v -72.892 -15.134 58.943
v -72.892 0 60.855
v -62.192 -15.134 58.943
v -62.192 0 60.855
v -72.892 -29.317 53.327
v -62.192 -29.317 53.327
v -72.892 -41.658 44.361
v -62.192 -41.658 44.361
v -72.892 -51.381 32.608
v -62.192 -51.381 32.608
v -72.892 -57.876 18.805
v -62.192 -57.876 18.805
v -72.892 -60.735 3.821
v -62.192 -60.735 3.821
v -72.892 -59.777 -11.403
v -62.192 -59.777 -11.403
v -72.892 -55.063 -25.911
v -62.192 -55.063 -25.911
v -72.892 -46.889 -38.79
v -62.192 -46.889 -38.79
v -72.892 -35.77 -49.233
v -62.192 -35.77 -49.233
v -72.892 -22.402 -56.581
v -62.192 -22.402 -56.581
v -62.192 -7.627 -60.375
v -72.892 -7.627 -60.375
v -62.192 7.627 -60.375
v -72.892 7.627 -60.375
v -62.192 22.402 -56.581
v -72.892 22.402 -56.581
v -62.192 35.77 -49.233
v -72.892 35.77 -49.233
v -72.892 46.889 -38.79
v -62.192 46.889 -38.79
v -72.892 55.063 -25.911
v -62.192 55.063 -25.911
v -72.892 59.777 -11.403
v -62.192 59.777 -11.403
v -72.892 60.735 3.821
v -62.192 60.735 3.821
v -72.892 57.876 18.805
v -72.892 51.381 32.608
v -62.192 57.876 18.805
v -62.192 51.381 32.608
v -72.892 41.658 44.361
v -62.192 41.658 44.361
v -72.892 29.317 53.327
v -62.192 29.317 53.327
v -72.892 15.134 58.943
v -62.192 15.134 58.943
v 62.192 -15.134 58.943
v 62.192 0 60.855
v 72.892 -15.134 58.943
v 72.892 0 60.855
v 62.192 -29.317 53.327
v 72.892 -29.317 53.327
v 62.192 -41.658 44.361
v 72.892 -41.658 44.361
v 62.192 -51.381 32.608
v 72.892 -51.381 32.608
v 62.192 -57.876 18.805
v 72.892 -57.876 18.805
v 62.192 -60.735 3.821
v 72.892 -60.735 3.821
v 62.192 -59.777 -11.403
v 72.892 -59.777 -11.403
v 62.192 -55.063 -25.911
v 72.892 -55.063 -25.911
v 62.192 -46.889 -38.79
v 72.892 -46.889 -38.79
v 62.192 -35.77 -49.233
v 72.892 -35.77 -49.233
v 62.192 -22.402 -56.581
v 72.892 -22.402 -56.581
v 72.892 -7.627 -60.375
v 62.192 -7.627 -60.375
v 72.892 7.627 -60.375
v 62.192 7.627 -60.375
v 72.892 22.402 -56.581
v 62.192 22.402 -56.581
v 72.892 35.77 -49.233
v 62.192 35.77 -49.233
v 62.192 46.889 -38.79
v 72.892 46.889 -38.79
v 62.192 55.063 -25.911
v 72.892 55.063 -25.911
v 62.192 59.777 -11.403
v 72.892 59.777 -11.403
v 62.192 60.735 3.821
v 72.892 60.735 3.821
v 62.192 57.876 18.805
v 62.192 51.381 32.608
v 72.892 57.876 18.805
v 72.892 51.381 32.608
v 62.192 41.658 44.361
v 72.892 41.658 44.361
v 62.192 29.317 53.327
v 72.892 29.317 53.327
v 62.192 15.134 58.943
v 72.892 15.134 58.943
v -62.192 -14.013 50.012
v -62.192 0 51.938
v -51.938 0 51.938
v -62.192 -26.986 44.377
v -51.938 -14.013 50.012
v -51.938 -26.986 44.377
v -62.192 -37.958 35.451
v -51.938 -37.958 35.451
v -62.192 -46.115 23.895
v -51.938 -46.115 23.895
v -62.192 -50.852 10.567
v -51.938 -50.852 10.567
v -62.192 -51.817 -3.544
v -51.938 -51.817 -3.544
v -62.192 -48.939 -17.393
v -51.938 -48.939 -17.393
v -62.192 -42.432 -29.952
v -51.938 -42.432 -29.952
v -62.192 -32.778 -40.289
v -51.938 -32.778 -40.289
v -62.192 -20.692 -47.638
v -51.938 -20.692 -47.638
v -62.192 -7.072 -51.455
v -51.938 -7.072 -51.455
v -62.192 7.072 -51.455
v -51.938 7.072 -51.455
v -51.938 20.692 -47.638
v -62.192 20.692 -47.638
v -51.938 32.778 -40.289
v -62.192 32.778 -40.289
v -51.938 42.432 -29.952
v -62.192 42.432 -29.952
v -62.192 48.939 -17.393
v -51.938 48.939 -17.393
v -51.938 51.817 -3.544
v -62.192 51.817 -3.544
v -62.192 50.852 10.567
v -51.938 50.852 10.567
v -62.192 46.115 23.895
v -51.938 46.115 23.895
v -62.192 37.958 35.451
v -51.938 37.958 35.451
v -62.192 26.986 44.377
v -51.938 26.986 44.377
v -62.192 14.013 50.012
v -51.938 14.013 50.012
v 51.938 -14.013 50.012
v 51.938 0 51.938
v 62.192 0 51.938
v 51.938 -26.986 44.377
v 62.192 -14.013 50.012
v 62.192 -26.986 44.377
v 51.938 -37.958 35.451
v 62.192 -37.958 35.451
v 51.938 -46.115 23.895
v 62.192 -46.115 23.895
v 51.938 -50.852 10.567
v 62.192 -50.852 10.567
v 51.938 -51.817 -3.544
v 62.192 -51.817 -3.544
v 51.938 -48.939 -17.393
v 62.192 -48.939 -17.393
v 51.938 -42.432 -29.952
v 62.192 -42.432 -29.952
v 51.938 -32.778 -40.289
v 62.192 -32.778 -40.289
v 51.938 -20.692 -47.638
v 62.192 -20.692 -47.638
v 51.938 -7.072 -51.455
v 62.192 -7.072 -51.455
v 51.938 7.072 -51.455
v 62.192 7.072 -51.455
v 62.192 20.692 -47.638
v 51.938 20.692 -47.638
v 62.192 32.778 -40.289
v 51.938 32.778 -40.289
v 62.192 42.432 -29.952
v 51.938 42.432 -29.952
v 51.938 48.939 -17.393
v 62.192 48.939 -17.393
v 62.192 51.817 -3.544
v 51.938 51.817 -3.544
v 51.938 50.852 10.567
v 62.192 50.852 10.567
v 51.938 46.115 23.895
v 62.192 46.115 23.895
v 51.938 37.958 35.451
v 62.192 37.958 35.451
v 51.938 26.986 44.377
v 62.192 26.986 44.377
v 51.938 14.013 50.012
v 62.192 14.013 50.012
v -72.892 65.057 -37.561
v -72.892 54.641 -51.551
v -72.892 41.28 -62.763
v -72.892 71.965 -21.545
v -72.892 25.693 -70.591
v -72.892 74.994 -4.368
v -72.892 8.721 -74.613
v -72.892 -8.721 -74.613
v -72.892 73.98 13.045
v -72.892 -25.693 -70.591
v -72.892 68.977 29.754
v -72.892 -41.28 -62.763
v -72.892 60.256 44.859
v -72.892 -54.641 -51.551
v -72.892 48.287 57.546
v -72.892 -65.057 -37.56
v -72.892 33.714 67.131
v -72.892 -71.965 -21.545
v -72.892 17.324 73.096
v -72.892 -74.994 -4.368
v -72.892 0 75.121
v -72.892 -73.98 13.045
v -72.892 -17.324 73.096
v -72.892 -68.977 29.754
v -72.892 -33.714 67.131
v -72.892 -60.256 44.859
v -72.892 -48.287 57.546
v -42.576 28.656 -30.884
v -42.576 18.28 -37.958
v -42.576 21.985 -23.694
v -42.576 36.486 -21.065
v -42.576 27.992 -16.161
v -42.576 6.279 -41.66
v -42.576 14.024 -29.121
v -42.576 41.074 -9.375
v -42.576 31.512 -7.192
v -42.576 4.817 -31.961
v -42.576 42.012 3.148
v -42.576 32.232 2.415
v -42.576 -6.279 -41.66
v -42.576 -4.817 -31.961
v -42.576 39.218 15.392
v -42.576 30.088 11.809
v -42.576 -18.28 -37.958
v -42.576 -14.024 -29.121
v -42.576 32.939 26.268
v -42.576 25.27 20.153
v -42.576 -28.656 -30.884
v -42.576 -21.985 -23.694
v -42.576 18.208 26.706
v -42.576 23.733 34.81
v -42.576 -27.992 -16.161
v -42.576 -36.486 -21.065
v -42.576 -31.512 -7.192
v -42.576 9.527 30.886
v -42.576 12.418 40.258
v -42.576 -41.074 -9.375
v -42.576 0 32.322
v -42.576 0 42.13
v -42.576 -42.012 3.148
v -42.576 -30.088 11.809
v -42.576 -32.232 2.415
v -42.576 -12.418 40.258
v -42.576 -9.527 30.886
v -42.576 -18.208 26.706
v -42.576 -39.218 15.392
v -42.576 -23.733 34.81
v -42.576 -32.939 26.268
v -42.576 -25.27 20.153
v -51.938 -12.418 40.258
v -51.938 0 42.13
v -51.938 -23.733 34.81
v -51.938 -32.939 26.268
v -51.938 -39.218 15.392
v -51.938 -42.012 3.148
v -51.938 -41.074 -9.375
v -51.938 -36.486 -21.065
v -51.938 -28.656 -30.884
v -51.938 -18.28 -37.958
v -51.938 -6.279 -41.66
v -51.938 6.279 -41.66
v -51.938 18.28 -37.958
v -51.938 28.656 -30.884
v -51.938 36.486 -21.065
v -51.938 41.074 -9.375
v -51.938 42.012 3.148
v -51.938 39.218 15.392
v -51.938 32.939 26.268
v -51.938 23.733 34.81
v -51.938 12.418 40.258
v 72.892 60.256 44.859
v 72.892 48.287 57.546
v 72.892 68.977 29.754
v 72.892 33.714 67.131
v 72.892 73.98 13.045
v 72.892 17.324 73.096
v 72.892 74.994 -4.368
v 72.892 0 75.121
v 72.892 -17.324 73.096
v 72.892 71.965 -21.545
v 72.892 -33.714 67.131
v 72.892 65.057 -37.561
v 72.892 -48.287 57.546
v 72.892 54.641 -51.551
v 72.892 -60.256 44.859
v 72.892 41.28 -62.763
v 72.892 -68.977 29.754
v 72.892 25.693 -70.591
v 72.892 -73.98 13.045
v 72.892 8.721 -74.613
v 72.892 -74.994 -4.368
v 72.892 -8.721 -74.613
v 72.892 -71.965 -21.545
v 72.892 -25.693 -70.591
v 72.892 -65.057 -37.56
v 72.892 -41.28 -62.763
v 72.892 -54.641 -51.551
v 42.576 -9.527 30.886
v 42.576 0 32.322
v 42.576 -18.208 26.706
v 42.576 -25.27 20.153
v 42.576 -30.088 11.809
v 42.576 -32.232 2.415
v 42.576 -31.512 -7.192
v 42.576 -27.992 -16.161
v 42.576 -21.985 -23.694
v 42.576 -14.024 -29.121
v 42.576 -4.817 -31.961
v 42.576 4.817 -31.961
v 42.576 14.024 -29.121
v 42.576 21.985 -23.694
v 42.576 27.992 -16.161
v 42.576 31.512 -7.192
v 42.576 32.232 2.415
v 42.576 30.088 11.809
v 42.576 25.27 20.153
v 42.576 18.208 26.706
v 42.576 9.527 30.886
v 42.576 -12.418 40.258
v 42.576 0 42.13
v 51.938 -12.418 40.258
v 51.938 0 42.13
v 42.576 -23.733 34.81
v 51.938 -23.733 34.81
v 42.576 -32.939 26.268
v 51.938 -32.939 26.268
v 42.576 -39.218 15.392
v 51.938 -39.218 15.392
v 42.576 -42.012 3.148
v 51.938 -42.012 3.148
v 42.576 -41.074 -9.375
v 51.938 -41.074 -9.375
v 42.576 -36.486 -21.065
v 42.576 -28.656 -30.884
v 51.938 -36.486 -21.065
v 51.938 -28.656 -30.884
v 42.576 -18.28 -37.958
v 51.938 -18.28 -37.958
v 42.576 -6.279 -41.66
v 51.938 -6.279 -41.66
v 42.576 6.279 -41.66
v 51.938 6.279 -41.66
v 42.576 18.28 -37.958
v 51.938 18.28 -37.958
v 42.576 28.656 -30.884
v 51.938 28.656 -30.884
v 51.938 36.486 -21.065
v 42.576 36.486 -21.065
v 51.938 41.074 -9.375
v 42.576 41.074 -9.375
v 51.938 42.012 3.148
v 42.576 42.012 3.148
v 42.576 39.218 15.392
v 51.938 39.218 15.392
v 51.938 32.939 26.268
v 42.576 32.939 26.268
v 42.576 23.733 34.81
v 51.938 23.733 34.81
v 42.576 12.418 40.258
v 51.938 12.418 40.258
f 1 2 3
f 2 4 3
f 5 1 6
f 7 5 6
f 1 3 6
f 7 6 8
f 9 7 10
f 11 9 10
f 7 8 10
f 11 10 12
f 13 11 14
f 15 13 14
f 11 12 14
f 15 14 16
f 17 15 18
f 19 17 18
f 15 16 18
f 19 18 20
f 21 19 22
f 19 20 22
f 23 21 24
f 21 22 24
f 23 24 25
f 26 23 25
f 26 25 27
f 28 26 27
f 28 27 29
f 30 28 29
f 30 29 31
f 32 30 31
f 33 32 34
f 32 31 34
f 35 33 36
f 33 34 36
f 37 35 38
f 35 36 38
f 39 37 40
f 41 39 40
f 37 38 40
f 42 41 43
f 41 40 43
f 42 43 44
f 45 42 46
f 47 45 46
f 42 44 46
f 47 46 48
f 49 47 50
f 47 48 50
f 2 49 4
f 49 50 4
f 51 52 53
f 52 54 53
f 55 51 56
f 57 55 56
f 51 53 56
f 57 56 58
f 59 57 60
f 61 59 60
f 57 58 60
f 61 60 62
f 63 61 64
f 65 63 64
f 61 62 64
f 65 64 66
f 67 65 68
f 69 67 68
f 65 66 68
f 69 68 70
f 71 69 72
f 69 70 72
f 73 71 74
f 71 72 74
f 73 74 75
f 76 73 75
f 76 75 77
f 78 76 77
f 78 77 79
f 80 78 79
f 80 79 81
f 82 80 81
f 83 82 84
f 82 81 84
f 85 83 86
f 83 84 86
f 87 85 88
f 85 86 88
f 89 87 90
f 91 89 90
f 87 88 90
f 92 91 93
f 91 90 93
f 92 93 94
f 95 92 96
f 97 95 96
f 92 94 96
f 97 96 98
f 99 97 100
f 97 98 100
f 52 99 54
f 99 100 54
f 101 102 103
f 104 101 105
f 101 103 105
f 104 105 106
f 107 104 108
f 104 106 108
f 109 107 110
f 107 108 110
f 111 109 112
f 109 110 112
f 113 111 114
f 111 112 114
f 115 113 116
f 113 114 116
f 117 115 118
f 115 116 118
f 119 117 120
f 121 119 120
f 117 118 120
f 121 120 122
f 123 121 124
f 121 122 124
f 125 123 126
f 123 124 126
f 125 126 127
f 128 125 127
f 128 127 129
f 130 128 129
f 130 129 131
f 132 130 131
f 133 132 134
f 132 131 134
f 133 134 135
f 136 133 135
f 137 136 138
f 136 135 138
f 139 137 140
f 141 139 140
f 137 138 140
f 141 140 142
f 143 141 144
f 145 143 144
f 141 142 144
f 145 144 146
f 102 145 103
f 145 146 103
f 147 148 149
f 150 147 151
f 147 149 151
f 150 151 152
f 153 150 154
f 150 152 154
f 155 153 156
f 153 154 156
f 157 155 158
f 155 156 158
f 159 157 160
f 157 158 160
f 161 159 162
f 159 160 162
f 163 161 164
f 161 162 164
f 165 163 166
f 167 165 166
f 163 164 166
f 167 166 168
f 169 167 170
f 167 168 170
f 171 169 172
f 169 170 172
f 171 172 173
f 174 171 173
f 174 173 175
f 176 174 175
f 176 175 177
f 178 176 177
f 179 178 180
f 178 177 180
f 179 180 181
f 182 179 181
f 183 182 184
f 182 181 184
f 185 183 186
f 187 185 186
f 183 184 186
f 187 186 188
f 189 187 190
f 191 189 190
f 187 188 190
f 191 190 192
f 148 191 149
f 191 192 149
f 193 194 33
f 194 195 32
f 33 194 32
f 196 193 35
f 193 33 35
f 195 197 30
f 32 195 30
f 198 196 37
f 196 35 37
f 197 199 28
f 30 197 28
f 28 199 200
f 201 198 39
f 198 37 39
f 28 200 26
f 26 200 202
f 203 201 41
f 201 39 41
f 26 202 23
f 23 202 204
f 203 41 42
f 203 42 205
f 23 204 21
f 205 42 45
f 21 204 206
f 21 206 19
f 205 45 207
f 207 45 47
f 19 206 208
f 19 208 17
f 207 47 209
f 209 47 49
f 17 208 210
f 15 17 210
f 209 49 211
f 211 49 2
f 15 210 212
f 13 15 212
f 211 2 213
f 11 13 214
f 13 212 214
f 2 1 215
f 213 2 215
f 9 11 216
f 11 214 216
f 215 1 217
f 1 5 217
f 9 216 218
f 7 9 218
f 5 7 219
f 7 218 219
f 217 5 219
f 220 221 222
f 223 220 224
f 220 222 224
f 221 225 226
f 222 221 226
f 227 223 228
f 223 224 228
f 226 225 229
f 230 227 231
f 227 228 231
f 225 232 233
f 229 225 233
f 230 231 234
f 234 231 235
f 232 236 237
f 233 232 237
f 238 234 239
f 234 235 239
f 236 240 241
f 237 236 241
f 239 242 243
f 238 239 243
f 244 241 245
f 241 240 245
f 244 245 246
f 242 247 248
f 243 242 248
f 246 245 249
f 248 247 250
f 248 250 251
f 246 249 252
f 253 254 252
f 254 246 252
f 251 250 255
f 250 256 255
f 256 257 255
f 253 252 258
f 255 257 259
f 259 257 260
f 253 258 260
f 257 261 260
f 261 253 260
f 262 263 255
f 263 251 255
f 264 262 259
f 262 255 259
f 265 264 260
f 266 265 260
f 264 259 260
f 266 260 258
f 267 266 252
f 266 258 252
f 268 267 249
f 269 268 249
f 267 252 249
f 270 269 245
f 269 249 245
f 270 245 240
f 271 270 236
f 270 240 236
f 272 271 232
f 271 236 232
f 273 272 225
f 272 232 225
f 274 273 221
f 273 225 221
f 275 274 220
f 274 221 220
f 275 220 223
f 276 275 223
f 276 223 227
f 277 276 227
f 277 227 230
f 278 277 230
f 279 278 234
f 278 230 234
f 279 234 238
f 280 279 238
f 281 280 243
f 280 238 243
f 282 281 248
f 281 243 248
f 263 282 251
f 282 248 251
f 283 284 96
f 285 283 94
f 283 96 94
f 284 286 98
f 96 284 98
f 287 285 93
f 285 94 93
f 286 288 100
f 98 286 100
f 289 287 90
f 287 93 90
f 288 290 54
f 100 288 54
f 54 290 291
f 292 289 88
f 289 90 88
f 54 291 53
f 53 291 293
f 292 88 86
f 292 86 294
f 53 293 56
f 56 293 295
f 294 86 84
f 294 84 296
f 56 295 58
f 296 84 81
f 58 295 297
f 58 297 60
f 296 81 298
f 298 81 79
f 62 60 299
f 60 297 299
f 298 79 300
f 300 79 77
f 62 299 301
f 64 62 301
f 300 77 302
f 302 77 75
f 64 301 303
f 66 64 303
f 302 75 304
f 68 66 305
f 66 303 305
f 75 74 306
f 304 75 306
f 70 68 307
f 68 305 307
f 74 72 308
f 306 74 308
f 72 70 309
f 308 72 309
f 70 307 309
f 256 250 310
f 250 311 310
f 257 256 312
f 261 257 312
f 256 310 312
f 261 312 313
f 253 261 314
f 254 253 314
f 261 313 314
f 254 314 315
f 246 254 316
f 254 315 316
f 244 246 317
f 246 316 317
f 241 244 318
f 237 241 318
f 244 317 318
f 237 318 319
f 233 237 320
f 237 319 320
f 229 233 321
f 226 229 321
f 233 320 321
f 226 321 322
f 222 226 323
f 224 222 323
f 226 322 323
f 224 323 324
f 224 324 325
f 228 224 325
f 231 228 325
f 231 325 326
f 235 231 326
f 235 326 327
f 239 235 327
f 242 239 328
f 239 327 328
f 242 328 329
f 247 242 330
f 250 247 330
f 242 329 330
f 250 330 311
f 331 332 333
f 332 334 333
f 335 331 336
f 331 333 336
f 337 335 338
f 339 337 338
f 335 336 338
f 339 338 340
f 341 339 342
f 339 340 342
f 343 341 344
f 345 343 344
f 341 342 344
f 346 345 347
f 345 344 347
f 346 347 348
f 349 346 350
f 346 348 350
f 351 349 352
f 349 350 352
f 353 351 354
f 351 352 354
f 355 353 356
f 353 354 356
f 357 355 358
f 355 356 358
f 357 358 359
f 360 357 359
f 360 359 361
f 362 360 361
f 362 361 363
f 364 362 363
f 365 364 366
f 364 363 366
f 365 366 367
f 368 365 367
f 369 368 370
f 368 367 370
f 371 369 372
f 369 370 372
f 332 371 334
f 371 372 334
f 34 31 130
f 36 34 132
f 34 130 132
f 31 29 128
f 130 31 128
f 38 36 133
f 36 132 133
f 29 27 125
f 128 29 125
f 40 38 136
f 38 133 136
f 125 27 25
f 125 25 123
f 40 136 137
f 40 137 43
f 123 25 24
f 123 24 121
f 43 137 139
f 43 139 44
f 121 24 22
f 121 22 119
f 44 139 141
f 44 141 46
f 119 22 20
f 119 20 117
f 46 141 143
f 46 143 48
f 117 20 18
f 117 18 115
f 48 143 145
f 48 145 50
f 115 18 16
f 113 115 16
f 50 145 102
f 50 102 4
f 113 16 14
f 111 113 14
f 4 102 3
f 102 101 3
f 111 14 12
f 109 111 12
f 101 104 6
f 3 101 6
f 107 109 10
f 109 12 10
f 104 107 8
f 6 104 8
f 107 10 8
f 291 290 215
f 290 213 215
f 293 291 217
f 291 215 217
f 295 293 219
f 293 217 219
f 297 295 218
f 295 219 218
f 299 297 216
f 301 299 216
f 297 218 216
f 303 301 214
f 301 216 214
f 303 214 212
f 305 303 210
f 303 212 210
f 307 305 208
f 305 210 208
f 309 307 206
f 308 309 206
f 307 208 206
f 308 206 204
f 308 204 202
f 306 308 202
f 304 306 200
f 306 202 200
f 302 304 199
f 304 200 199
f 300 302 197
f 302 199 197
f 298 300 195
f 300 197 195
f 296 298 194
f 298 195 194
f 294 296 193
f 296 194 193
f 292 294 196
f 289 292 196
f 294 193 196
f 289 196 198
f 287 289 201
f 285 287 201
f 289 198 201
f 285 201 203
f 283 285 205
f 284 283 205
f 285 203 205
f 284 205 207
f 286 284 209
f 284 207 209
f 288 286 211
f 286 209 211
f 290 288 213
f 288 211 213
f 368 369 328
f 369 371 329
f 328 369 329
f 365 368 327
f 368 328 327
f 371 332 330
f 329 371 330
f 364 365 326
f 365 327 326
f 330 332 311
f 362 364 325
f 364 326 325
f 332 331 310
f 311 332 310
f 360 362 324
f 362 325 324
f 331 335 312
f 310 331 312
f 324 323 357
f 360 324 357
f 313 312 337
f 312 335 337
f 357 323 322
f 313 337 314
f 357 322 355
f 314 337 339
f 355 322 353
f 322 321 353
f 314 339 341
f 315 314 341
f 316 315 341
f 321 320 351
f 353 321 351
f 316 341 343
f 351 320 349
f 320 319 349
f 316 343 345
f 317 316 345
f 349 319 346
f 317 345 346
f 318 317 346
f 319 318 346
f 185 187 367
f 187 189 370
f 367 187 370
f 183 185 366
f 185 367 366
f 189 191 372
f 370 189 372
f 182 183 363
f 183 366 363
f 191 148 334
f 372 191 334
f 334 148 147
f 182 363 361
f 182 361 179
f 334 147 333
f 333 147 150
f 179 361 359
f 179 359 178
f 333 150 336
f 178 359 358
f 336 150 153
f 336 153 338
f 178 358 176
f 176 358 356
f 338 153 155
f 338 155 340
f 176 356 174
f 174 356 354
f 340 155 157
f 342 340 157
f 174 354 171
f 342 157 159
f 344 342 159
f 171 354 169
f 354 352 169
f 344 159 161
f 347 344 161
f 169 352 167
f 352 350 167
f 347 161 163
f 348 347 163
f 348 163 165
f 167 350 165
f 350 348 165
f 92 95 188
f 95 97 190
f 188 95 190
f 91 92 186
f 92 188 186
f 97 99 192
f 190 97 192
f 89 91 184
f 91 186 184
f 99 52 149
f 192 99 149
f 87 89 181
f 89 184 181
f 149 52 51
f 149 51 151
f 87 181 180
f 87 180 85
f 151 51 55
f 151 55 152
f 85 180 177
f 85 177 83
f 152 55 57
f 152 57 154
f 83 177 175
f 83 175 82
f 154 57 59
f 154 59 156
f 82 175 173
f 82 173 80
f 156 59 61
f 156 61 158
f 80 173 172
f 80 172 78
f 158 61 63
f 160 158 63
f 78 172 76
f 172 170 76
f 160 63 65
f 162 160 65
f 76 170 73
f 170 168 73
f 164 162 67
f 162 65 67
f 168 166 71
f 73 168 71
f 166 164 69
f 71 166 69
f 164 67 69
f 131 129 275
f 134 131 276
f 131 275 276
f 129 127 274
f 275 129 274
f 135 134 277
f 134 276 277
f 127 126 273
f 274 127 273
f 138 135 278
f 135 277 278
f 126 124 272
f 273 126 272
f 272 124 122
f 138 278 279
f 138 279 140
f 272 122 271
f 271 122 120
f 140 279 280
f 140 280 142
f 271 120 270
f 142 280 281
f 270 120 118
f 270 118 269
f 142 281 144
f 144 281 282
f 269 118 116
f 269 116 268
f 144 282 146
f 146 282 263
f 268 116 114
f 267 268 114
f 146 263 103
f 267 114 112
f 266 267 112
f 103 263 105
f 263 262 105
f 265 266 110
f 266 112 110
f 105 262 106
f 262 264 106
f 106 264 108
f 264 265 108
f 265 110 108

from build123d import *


with BuildPart() as f1:
    # F0 (on Front) → F1 (revolve)
    with BuildSketch(Plane.XZ):
        Polygon((-42.576, 32.322101), (0, 32.322101), (0, 75.121), (-72.891891, 75.121), (-72.891891, 60.854718), (-62.192168, 60.854718), (-62.192168, 51.938277), (-51.938262, 51.938277), (-51.938262, 42.130191), (-42.576, 42.130191), align=None)
        Polygon((0, 75.121), (0, 32.322101), (42.576, 32.322101), (42.576, 42.130191), (51.938262, 42.130191), (51.938262, 51.938277), (62.192168, 51.938277), (62.192168, 60.854718), (72.891891, 60.854718), (72.891891, 75.121), align=None)
    revolve(axis=Axis((0.891461, 0, 0), (1, 0, 0)))


solid = f1.part
